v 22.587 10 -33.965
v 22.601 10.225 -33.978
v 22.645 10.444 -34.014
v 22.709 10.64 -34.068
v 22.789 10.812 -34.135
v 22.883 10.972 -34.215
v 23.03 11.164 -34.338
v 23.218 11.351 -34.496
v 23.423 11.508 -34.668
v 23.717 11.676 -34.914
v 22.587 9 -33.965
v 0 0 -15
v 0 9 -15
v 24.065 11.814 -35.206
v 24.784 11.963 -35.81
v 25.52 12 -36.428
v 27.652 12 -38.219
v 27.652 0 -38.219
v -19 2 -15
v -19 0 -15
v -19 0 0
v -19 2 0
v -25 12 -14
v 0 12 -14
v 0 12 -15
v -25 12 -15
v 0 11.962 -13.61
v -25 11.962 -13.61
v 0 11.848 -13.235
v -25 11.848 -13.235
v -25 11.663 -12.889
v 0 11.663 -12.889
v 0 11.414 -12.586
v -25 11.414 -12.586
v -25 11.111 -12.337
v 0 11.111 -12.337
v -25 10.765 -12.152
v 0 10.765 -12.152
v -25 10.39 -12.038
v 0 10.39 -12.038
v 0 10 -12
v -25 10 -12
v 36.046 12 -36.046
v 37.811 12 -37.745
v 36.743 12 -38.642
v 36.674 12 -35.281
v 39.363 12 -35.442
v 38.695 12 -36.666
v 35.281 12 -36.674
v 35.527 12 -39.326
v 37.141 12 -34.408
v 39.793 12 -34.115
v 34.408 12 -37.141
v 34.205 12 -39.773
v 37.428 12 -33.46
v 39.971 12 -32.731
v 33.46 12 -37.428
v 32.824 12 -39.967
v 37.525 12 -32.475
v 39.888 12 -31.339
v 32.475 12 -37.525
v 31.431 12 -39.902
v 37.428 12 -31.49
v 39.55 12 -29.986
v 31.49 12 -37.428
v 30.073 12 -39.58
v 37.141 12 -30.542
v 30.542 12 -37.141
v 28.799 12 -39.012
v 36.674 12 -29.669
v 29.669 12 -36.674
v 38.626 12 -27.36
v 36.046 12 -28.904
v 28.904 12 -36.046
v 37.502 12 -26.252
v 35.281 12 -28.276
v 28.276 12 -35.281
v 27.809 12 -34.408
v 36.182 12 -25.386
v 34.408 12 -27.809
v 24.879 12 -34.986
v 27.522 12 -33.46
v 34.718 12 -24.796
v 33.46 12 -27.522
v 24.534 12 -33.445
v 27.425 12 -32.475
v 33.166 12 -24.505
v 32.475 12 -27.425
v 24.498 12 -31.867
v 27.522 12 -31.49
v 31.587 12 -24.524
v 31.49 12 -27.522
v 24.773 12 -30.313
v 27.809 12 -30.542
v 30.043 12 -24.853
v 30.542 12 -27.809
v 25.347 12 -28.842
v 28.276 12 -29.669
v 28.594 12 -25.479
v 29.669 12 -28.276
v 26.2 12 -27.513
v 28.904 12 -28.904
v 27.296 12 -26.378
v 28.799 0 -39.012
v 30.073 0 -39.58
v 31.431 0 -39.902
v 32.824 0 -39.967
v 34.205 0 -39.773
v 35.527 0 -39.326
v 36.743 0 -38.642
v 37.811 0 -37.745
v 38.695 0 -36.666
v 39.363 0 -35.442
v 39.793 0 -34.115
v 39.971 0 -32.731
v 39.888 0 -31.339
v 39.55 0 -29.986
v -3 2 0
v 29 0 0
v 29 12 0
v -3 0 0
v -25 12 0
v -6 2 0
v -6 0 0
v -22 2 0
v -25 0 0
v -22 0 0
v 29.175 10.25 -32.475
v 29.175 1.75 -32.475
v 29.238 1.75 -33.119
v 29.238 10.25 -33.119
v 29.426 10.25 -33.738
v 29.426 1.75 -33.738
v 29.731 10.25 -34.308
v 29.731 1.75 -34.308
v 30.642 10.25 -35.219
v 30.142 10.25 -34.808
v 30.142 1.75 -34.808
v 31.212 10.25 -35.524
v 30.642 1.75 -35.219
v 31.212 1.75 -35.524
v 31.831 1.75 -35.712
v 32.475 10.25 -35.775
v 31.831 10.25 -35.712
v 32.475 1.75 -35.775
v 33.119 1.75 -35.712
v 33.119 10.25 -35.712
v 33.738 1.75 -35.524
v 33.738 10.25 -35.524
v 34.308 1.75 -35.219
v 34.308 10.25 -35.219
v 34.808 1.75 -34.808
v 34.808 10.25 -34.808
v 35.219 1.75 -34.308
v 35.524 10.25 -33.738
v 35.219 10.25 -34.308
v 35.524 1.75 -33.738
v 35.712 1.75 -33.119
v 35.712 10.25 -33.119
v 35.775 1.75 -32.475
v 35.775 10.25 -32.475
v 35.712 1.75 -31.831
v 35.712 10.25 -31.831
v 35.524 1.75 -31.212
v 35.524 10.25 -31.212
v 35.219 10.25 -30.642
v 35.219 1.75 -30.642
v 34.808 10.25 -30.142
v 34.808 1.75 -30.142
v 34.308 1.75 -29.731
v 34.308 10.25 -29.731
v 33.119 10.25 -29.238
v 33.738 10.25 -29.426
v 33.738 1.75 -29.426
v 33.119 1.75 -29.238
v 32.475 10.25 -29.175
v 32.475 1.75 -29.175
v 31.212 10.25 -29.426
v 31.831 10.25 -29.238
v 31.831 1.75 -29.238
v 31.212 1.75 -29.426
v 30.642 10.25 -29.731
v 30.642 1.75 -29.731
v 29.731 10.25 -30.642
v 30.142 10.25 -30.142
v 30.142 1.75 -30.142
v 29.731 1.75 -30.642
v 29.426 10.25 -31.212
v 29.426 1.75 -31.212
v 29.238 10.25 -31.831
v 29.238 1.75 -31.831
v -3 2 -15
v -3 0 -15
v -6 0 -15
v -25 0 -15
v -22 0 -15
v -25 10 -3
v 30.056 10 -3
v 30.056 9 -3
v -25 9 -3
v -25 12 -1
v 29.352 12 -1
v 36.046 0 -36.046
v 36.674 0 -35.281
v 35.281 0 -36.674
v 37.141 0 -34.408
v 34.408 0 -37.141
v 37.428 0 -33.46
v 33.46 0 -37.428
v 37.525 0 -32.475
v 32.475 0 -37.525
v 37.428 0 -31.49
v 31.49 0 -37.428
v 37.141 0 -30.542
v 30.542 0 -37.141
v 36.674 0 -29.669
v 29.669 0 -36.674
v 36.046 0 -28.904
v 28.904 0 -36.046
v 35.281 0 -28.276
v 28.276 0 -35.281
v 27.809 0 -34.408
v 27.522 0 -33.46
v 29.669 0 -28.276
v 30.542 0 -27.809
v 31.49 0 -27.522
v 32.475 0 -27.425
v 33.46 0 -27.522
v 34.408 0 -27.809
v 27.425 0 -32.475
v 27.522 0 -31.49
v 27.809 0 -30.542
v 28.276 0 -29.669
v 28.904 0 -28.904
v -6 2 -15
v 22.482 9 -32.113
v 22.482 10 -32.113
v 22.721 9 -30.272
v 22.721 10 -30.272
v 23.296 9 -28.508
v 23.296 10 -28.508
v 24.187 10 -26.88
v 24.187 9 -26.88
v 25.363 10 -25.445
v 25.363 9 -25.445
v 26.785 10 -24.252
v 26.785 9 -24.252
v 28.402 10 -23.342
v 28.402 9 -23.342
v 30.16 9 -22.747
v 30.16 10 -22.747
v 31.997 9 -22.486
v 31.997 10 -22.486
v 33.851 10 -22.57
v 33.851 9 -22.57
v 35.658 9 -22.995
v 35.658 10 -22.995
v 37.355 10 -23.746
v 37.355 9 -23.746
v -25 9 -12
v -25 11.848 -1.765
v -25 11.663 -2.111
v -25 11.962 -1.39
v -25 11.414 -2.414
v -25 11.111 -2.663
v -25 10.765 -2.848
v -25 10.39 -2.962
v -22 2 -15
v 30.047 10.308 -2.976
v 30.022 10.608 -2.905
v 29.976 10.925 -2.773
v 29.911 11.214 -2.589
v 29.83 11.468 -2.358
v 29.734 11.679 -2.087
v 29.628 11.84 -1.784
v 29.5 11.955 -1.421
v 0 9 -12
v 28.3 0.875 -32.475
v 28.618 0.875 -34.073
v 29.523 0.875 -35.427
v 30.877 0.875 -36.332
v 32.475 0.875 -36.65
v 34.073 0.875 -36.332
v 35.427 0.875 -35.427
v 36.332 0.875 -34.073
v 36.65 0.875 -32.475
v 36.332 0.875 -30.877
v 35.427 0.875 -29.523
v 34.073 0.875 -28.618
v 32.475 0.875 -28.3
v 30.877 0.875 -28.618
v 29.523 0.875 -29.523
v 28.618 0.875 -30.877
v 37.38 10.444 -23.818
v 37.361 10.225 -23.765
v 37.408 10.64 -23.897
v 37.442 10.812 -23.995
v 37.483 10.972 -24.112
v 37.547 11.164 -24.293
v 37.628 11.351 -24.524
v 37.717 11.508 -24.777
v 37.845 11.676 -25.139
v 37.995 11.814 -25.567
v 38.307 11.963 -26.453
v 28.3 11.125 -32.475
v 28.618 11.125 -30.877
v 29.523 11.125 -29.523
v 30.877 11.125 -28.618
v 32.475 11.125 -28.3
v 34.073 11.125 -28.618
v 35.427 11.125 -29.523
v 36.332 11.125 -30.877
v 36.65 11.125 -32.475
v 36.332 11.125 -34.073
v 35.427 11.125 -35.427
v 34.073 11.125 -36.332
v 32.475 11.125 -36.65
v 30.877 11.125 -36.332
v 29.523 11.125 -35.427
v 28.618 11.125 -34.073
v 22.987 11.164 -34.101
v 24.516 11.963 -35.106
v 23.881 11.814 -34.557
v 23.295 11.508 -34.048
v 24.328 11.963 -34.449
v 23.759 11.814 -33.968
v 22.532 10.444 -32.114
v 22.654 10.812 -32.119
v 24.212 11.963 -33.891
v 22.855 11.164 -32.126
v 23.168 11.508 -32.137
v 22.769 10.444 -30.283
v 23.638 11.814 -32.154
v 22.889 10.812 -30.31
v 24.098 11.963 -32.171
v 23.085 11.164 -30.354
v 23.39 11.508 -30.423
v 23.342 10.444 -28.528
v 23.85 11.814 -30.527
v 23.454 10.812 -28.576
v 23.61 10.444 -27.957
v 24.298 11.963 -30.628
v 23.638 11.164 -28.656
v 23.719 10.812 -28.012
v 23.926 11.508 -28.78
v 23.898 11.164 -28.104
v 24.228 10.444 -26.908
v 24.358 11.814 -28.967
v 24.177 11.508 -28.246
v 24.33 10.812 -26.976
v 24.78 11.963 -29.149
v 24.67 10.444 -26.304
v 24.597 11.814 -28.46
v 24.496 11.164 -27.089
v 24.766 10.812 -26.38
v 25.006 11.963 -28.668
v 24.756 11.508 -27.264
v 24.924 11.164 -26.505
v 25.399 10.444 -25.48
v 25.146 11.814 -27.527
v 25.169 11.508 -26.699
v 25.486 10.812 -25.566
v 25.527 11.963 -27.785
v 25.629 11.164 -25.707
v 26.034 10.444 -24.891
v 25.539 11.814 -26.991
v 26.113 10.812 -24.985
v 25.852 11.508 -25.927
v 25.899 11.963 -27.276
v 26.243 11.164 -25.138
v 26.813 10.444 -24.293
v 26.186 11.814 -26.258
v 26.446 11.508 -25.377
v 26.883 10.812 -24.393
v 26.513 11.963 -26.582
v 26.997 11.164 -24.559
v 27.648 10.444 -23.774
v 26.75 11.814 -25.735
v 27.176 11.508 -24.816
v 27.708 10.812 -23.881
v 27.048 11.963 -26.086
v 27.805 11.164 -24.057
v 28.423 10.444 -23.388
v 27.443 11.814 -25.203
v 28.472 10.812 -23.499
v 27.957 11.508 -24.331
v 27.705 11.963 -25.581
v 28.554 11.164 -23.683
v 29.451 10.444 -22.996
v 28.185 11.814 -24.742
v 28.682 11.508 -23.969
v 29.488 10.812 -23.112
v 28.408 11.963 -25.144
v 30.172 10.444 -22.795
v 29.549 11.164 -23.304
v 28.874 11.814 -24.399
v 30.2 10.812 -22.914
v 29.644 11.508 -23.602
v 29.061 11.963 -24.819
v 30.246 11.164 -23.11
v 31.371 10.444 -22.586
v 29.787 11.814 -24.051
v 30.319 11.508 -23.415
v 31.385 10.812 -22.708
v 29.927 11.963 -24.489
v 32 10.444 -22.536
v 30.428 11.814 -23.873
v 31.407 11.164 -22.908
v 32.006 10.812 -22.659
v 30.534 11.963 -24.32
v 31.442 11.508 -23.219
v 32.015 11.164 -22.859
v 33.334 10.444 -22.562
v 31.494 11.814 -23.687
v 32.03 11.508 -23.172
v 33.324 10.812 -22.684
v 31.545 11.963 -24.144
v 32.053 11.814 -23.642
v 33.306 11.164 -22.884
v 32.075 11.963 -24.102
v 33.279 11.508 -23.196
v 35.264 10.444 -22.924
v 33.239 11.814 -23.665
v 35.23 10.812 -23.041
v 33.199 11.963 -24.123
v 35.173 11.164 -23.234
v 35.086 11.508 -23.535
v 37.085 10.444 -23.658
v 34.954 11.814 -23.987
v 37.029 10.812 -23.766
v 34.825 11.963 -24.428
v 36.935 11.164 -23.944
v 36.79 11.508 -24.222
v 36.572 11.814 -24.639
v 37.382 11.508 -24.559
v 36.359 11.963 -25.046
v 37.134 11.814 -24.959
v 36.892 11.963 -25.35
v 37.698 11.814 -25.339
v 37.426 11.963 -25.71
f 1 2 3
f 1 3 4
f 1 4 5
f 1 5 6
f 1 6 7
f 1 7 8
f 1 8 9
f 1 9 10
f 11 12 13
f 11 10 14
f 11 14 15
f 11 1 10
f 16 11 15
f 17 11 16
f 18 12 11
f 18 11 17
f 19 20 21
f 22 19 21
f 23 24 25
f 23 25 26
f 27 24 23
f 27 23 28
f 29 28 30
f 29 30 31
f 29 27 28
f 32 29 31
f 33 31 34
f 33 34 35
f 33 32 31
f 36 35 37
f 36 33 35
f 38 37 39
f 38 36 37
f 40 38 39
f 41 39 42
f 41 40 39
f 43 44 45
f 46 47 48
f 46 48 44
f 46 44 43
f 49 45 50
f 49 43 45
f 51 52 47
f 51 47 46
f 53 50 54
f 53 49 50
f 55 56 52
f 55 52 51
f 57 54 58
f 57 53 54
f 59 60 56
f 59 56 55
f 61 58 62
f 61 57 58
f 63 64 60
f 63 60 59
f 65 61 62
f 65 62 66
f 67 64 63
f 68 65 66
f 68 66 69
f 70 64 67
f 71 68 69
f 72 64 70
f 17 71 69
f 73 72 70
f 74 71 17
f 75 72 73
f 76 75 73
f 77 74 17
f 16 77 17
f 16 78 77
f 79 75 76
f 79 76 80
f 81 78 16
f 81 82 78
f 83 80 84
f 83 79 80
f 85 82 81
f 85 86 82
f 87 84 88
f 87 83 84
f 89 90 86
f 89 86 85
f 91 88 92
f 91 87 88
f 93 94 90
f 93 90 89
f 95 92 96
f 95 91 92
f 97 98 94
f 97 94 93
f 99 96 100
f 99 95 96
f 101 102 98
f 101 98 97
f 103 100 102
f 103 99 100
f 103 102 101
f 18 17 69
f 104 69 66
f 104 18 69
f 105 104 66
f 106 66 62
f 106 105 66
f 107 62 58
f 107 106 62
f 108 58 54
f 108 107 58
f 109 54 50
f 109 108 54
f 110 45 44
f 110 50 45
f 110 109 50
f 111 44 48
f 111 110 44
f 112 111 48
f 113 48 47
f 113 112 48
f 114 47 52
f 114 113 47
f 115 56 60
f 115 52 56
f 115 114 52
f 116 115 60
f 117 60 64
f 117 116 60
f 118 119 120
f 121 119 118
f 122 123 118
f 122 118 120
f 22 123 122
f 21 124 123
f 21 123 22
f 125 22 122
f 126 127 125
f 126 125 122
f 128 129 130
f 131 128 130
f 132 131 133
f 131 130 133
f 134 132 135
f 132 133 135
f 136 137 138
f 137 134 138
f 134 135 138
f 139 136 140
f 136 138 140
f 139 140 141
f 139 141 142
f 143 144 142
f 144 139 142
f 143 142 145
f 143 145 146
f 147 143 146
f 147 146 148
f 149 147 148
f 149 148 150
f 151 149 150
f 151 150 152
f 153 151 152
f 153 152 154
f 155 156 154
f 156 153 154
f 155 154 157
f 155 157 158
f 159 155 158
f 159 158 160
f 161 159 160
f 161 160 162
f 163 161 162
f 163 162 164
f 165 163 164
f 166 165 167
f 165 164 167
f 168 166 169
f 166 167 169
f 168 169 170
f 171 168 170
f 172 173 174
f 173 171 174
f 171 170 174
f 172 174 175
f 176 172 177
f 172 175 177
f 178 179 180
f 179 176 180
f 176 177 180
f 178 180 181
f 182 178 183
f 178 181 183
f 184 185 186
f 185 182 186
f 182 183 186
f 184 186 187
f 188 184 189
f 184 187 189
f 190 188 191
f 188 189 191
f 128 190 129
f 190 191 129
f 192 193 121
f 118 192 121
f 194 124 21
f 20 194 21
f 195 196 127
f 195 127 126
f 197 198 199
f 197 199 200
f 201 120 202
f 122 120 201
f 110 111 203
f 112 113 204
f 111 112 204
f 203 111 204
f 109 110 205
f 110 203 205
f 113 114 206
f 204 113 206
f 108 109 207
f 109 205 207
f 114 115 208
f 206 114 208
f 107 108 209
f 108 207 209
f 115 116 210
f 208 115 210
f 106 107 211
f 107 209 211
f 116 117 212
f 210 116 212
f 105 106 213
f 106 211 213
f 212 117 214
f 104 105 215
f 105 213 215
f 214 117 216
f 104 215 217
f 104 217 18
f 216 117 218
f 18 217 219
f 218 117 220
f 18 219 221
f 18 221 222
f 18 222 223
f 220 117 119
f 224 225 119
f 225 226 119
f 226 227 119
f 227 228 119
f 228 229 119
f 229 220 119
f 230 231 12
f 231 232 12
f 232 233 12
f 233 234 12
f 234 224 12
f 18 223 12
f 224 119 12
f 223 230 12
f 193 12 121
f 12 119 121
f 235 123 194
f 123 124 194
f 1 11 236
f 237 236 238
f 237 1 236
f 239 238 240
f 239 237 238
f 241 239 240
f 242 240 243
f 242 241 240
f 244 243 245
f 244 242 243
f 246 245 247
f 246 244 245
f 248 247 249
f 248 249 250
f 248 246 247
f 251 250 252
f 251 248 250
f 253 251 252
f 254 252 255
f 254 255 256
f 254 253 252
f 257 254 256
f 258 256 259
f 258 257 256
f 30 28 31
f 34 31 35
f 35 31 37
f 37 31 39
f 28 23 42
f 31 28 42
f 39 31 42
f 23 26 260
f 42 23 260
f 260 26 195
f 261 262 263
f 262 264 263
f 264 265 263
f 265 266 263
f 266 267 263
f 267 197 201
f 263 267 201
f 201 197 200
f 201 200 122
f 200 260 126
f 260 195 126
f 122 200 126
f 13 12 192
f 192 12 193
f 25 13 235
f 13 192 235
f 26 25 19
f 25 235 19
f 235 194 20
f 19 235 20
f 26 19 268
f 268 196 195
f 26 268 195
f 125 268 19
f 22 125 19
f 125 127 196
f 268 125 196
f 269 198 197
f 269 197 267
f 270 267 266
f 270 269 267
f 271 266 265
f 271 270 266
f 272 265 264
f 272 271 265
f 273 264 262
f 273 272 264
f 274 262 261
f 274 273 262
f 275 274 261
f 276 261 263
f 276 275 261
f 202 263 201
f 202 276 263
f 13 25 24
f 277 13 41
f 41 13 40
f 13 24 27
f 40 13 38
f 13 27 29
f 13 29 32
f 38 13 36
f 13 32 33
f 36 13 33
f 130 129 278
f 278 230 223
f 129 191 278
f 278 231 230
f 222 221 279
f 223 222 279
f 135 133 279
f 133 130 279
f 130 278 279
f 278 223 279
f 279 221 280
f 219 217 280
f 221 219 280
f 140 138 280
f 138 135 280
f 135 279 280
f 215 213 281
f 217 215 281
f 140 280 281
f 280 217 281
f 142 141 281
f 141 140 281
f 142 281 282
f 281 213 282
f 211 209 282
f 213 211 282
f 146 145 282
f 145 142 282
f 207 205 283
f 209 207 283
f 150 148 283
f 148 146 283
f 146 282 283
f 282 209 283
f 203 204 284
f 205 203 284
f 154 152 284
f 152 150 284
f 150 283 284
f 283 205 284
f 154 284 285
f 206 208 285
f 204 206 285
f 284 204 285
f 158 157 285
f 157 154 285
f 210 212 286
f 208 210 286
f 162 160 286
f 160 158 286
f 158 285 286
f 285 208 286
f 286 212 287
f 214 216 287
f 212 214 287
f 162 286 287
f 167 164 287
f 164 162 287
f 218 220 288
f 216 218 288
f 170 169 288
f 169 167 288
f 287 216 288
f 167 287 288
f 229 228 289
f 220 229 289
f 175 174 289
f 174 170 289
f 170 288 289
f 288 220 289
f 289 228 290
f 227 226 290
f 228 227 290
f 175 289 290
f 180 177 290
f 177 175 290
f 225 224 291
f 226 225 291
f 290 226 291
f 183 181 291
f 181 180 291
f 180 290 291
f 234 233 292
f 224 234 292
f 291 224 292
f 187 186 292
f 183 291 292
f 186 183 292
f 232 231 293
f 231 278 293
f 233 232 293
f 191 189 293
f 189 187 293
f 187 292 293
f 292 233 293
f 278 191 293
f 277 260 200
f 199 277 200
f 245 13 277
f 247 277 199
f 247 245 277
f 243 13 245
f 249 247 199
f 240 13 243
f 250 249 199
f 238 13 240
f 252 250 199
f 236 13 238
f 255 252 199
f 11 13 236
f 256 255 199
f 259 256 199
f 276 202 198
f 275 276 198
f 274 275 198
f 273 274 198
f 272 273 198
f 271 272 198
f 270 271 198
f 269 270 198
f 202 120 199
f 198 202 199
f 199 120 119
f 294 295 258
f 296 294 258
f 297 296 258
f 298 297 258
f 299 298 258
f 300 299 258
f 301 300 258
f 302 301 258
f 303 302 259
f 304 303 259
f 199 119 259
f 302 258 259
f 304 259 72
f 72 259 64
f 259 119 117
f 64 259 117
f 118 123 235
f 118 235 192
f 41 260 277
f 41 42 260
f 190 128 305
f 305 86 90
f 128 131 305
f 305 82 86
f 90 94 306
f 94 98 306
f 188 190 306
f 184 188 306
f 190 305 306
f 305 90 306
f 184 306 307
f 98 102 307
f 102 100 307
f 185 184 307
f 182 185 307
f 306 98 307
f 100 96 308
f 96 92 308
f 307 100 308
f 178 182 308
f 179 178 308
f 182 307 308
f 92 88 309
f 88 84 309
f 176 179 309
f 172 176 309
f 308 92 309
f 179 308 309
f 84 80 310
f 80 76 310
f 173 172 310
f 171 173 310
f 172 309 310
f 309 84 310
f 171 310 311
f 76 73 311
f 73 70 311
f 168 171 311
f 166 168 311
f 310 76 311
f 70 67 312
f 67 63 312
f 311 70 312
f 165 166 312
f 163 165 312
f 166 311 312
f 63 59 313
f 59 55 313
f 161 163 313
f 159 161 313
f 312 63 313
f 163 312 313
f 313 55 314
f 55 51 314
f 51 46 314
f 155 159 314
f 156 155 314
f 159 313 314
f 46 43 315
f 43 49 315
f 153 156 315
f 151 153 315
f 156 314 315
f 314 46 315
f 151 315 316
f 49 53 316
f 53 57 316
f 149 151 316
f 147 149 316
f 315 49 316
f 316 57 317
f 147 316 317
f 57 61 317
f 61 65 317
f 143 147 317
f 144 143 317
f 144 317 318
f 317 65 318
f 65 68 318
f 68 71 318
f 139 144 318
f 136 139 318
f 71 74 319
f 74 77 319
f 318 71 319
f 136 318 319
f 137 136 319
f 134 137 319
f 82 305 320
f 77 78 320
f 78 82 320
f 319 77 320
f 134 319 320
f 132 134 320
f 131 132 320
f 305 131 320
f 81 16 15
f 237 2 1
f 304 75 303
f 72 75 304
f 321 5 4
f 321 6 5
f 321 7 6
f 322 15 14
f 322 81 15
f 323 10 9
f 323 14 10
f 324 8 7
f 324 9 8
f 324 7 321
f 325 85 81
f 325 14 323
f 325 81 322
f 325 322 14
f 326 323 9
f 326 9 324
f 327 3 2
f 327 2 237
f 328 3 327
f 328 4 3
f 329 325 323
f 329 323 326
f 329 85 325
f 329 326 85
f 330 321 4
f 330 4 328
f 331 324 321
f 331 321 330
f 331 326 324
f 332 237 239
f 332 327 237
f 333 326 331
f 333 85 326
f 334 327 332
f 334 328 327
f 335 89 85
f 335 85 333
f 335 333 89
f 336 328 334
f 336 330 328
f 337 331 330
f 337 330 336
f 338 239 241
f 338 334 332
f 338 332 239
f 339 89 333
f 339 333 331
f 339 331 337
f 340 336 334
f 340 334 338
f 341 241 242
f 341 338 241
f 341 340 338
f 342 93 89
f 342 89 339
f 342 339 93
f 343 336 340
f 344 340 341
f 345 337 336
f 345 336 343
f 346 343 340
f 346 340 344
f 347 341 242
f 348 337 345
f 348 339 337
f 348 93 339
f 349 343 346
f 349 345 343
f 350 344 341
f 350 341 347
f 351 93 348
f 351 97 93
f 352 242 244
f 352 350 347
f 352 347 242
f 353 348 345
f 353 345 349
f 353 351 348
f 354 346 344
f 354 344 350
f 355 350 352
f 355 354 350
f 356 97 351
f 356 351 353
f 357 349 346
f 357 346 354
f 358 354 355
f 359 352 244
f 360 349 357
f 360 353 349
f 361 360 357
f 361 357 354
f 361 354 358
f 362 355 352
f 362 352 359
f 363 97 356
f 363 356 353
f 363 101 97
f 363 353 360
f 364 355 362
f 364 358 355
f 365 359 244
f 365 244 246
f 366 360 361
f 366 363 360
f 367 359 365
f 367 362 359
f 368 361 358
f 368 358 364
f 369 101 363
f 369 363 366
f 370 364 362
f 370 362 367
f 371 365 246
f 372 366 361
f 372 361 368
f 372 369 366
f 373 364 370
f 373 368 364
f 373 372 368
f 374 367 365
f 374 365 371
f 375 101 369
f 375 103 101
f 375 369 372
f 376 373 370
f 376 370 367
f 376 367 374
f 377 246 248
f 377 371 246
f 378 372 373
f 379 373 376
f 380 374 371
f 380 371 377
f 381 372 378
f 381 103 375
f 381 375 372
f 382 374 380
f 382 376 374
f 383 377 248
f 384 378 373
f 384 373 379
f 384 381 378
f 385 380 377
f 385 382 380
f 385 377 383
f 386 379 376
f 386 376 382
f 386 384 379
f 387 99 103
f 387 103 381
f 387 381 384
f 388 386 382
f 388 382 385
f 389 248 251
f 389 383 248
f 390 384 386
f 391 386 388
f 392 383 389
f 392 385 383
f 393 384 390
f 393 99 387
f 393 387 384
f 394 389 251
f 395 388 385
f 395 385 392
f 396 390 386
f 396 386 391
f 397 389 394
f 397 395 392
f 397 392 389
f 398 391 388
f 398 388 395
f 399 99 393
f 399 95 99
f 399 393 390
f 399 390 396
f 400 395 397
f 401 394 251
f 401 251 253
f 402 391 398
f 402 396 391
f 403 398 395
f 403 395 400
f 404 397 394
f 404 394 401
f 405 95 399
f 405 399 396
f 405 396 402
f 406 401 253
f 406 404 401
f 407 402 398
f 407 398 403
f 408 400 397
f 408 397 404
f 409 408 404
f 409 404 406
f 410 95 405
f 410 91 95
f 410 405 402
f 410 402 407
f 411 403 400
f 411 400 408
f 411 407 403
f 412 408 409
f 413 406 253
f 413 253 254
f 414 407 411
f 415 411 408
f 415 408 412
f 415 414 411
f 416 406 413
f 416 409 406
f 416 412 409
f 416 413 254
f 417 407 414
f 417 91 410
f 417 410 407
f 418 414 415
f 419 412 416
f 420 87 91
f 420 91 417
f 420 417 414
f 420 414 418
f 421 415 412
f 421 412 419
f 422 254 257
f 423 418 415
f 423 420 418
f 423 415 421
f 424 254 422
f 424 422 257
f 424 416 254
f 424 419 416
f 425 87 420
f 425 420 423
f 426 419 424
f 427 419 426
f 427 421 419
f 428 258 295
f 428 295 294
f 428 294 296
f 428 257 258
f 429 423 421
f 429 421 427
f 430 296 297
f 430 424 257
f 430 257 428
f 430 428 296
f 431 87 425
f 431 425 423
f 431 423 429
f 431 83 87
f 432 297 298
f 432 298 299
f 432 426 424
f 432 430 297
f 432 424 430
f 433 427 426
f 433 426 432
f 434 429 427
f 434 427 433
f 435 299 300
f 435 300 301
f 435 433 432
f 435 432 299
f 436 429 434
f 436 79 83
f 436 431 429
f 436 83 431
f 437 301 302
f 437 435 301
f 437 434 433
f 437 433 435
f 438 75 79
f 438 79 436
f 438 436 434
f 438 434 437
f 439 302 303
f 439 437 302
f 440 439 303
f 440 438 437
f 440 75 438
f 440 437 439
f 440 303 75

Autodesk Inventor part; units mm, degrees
ref_plane "YZ Plane" through (0, 0, 0) normal (1, 0, 0) x (0, 1, 0)
ref_plane "XZ Plane" through (0, 0, 0) normal (0, 1, 0) x (-1, 0, 0)
ref_plane "XY Plane" through (0, 0, 0) normal (0, 0, 1) x (1, 0, 0)
sketch "Sketch1" plane through (0, 0, 0) normal (0, 1, 0) x (-1, 0, 0)
  circle A0 centre (-32.475, -32.475) radius 3.3
  circle A1 centre (-32.475, -32.475) radius 7.5
  line L0 (25, 0) -> (0, 0)
  line L1 (0, 0) -> (0, -15)
  line L2 (0, -15) -> (25, -15)
  line L3 (25, -15) -> (25, 0)
  line L4 (0, 20) -> (-29, 20)
  line L5 (-29, 20) -> (-29, 0)
  line L6 (-29, 0) -> (0, 0)
  line L7 (0, 0) -> (0, 20)
  line L8 (0, 0) -> (-36.8411, -26.3768)
  line L9 (0, -15) -> (-27.6522, -38.2187)
  line L10 (-29, 0) -> (-39.5499, -29.9858)
  line L11 (0, 0) -> (-55.6524, 0) construction
  line L12 (-55.6524, 0) -> (-55.6524, -63.0935) construction
  line L13 (-55.6524, -63.0935) -> (0, -63.0935) construction
  line L14 (0, -63.0935) -> (0, 0) construction
  dimension "d0" = 6.6
  dimension "d1" = 32.475
  dimension "d2" = 32.475
  dimension "d3" = 15
  dimension "d4" = 25
  dimension "d6" = 15
  dimension "d7" = 29
  dimension "d8" = 20
extrude "Extrusion1" add sketch "Sketch1" along normal blind 12 contours A1 | A1 L8 L1 L9 | A1 L10 L6 L8 | L0 L3 L2 L1
sketch "Sketch2" plane through (0, 12, 0) normal (0, 1, 0) x (1, 0, 0)
  circle A0 centre (32.475, 32.475) radius 3.3 projected
  circle A1 centre (32.475, 32.475) radius 10
  line L0 (-25, 15) -> (-25, 0) projected
  line L1 (-25, 0) -> (29, 0) projected
  line L2 (29, 0) -> (39.5499, 29.9858) projected
  arc A2 (39.5499, 29.9858) -> (27.6522, 38.2187) centre (32.475, 32.475) ccw projected
  line L3 (27.6522, 38.2187) -> (0, 15) projected
  line L4 (0, 15) -> (-25, 15) projected
  circle A3 centre (32.475, 32.475) radius 3.3 projected
  line L5 (-25, 15) -> (-25, 0) projected
  line L6 (-25, 12) -> (0, 12)
  line L7 (0, 12) -> (0, 3)
  line L8 (0, 3) -> (-25, 3)
  line L9 (-25, 3) -> (-25, 12)
  line L10 (27.6522, 38.2187) -> (0, 15) projected
  line L11 (0, 15) -> (0, 0)
  line L12 (29, 0) -> (39.5499, 29.9858) projected
  line L13 (0, 0) -> (30.0555, 0)
  line L14 (30.0555, 0) -> (30.0555, 3)
  line L15 (30.0555, 3) -> (0, 3)
  line L16 (0, 3) -> (0, 0)
  point P0 (37.3547, 23.7464)
  point P1 (22.5867, 33.9654)
  point P2 (-25, 7.5)
  point P3 (-25, 3)
  dimension "d11" = 20
  dimension "d14" = 9
extrude "Extrusion2" cut sketch "Sketch2" against normal blind 3 contours A1 L2 L15 L7 L11 L3 | L14 L13 L2 | L7 L8 L0 L6
sketch "Sketch6" plane through (0, 0, 0) normal (0, -1, 0) x (1, 0, 0)
  line L0 (0, -15) -> (-25, -15) projected
  line L1 (-25, 0) -> (29, 0) projected
  line L2 (-22, -15) -> (-19, -15)
  line L3 (-19, -15) -> (-19, 0)
  line L4 (-19, 0) -> (-22, 0)
  line L5 (-22, 0) -> (-22, -15)
  line L6 (-6, -15) -> (-3, -15)
  line L7 (-3, -15) -> (-3, 0)
  line L8 (-3, 0) -> (-6, 0)
  line L9 (-6, 0) -> (-6, -15)
  line L10 (-25, -15) -> (-25, 0) projected
  point P0 (0, 0)
  point P1 (-2, 0)
  point P2 (-3, 0)
  point P3 (-22, 0)
  point P4 (-19, -15)
  dimension "d31" = 3
  dimension "d32" = 3
  dimension "d33" = 3
  dimension "d34" = 3
extrude "Extrusion6" cut sketch "Sketch6" against normal blind 2 contours L0 L9 L1 L7 | L0 L5 L1 L3
chamfer "Chamfer1" distance 1.75 angle 45 2 edges at (35.775, 12, -32.475) (35.775, 0, -32.475)
fillet "Fillet1" radius 2 3 edges at (2.5277, 12, -3) (-12.5, 12, -12) (26.7848, 12, -24.2518)
equation "\"d2\" = d1"
properties part number "Strain Relief"
